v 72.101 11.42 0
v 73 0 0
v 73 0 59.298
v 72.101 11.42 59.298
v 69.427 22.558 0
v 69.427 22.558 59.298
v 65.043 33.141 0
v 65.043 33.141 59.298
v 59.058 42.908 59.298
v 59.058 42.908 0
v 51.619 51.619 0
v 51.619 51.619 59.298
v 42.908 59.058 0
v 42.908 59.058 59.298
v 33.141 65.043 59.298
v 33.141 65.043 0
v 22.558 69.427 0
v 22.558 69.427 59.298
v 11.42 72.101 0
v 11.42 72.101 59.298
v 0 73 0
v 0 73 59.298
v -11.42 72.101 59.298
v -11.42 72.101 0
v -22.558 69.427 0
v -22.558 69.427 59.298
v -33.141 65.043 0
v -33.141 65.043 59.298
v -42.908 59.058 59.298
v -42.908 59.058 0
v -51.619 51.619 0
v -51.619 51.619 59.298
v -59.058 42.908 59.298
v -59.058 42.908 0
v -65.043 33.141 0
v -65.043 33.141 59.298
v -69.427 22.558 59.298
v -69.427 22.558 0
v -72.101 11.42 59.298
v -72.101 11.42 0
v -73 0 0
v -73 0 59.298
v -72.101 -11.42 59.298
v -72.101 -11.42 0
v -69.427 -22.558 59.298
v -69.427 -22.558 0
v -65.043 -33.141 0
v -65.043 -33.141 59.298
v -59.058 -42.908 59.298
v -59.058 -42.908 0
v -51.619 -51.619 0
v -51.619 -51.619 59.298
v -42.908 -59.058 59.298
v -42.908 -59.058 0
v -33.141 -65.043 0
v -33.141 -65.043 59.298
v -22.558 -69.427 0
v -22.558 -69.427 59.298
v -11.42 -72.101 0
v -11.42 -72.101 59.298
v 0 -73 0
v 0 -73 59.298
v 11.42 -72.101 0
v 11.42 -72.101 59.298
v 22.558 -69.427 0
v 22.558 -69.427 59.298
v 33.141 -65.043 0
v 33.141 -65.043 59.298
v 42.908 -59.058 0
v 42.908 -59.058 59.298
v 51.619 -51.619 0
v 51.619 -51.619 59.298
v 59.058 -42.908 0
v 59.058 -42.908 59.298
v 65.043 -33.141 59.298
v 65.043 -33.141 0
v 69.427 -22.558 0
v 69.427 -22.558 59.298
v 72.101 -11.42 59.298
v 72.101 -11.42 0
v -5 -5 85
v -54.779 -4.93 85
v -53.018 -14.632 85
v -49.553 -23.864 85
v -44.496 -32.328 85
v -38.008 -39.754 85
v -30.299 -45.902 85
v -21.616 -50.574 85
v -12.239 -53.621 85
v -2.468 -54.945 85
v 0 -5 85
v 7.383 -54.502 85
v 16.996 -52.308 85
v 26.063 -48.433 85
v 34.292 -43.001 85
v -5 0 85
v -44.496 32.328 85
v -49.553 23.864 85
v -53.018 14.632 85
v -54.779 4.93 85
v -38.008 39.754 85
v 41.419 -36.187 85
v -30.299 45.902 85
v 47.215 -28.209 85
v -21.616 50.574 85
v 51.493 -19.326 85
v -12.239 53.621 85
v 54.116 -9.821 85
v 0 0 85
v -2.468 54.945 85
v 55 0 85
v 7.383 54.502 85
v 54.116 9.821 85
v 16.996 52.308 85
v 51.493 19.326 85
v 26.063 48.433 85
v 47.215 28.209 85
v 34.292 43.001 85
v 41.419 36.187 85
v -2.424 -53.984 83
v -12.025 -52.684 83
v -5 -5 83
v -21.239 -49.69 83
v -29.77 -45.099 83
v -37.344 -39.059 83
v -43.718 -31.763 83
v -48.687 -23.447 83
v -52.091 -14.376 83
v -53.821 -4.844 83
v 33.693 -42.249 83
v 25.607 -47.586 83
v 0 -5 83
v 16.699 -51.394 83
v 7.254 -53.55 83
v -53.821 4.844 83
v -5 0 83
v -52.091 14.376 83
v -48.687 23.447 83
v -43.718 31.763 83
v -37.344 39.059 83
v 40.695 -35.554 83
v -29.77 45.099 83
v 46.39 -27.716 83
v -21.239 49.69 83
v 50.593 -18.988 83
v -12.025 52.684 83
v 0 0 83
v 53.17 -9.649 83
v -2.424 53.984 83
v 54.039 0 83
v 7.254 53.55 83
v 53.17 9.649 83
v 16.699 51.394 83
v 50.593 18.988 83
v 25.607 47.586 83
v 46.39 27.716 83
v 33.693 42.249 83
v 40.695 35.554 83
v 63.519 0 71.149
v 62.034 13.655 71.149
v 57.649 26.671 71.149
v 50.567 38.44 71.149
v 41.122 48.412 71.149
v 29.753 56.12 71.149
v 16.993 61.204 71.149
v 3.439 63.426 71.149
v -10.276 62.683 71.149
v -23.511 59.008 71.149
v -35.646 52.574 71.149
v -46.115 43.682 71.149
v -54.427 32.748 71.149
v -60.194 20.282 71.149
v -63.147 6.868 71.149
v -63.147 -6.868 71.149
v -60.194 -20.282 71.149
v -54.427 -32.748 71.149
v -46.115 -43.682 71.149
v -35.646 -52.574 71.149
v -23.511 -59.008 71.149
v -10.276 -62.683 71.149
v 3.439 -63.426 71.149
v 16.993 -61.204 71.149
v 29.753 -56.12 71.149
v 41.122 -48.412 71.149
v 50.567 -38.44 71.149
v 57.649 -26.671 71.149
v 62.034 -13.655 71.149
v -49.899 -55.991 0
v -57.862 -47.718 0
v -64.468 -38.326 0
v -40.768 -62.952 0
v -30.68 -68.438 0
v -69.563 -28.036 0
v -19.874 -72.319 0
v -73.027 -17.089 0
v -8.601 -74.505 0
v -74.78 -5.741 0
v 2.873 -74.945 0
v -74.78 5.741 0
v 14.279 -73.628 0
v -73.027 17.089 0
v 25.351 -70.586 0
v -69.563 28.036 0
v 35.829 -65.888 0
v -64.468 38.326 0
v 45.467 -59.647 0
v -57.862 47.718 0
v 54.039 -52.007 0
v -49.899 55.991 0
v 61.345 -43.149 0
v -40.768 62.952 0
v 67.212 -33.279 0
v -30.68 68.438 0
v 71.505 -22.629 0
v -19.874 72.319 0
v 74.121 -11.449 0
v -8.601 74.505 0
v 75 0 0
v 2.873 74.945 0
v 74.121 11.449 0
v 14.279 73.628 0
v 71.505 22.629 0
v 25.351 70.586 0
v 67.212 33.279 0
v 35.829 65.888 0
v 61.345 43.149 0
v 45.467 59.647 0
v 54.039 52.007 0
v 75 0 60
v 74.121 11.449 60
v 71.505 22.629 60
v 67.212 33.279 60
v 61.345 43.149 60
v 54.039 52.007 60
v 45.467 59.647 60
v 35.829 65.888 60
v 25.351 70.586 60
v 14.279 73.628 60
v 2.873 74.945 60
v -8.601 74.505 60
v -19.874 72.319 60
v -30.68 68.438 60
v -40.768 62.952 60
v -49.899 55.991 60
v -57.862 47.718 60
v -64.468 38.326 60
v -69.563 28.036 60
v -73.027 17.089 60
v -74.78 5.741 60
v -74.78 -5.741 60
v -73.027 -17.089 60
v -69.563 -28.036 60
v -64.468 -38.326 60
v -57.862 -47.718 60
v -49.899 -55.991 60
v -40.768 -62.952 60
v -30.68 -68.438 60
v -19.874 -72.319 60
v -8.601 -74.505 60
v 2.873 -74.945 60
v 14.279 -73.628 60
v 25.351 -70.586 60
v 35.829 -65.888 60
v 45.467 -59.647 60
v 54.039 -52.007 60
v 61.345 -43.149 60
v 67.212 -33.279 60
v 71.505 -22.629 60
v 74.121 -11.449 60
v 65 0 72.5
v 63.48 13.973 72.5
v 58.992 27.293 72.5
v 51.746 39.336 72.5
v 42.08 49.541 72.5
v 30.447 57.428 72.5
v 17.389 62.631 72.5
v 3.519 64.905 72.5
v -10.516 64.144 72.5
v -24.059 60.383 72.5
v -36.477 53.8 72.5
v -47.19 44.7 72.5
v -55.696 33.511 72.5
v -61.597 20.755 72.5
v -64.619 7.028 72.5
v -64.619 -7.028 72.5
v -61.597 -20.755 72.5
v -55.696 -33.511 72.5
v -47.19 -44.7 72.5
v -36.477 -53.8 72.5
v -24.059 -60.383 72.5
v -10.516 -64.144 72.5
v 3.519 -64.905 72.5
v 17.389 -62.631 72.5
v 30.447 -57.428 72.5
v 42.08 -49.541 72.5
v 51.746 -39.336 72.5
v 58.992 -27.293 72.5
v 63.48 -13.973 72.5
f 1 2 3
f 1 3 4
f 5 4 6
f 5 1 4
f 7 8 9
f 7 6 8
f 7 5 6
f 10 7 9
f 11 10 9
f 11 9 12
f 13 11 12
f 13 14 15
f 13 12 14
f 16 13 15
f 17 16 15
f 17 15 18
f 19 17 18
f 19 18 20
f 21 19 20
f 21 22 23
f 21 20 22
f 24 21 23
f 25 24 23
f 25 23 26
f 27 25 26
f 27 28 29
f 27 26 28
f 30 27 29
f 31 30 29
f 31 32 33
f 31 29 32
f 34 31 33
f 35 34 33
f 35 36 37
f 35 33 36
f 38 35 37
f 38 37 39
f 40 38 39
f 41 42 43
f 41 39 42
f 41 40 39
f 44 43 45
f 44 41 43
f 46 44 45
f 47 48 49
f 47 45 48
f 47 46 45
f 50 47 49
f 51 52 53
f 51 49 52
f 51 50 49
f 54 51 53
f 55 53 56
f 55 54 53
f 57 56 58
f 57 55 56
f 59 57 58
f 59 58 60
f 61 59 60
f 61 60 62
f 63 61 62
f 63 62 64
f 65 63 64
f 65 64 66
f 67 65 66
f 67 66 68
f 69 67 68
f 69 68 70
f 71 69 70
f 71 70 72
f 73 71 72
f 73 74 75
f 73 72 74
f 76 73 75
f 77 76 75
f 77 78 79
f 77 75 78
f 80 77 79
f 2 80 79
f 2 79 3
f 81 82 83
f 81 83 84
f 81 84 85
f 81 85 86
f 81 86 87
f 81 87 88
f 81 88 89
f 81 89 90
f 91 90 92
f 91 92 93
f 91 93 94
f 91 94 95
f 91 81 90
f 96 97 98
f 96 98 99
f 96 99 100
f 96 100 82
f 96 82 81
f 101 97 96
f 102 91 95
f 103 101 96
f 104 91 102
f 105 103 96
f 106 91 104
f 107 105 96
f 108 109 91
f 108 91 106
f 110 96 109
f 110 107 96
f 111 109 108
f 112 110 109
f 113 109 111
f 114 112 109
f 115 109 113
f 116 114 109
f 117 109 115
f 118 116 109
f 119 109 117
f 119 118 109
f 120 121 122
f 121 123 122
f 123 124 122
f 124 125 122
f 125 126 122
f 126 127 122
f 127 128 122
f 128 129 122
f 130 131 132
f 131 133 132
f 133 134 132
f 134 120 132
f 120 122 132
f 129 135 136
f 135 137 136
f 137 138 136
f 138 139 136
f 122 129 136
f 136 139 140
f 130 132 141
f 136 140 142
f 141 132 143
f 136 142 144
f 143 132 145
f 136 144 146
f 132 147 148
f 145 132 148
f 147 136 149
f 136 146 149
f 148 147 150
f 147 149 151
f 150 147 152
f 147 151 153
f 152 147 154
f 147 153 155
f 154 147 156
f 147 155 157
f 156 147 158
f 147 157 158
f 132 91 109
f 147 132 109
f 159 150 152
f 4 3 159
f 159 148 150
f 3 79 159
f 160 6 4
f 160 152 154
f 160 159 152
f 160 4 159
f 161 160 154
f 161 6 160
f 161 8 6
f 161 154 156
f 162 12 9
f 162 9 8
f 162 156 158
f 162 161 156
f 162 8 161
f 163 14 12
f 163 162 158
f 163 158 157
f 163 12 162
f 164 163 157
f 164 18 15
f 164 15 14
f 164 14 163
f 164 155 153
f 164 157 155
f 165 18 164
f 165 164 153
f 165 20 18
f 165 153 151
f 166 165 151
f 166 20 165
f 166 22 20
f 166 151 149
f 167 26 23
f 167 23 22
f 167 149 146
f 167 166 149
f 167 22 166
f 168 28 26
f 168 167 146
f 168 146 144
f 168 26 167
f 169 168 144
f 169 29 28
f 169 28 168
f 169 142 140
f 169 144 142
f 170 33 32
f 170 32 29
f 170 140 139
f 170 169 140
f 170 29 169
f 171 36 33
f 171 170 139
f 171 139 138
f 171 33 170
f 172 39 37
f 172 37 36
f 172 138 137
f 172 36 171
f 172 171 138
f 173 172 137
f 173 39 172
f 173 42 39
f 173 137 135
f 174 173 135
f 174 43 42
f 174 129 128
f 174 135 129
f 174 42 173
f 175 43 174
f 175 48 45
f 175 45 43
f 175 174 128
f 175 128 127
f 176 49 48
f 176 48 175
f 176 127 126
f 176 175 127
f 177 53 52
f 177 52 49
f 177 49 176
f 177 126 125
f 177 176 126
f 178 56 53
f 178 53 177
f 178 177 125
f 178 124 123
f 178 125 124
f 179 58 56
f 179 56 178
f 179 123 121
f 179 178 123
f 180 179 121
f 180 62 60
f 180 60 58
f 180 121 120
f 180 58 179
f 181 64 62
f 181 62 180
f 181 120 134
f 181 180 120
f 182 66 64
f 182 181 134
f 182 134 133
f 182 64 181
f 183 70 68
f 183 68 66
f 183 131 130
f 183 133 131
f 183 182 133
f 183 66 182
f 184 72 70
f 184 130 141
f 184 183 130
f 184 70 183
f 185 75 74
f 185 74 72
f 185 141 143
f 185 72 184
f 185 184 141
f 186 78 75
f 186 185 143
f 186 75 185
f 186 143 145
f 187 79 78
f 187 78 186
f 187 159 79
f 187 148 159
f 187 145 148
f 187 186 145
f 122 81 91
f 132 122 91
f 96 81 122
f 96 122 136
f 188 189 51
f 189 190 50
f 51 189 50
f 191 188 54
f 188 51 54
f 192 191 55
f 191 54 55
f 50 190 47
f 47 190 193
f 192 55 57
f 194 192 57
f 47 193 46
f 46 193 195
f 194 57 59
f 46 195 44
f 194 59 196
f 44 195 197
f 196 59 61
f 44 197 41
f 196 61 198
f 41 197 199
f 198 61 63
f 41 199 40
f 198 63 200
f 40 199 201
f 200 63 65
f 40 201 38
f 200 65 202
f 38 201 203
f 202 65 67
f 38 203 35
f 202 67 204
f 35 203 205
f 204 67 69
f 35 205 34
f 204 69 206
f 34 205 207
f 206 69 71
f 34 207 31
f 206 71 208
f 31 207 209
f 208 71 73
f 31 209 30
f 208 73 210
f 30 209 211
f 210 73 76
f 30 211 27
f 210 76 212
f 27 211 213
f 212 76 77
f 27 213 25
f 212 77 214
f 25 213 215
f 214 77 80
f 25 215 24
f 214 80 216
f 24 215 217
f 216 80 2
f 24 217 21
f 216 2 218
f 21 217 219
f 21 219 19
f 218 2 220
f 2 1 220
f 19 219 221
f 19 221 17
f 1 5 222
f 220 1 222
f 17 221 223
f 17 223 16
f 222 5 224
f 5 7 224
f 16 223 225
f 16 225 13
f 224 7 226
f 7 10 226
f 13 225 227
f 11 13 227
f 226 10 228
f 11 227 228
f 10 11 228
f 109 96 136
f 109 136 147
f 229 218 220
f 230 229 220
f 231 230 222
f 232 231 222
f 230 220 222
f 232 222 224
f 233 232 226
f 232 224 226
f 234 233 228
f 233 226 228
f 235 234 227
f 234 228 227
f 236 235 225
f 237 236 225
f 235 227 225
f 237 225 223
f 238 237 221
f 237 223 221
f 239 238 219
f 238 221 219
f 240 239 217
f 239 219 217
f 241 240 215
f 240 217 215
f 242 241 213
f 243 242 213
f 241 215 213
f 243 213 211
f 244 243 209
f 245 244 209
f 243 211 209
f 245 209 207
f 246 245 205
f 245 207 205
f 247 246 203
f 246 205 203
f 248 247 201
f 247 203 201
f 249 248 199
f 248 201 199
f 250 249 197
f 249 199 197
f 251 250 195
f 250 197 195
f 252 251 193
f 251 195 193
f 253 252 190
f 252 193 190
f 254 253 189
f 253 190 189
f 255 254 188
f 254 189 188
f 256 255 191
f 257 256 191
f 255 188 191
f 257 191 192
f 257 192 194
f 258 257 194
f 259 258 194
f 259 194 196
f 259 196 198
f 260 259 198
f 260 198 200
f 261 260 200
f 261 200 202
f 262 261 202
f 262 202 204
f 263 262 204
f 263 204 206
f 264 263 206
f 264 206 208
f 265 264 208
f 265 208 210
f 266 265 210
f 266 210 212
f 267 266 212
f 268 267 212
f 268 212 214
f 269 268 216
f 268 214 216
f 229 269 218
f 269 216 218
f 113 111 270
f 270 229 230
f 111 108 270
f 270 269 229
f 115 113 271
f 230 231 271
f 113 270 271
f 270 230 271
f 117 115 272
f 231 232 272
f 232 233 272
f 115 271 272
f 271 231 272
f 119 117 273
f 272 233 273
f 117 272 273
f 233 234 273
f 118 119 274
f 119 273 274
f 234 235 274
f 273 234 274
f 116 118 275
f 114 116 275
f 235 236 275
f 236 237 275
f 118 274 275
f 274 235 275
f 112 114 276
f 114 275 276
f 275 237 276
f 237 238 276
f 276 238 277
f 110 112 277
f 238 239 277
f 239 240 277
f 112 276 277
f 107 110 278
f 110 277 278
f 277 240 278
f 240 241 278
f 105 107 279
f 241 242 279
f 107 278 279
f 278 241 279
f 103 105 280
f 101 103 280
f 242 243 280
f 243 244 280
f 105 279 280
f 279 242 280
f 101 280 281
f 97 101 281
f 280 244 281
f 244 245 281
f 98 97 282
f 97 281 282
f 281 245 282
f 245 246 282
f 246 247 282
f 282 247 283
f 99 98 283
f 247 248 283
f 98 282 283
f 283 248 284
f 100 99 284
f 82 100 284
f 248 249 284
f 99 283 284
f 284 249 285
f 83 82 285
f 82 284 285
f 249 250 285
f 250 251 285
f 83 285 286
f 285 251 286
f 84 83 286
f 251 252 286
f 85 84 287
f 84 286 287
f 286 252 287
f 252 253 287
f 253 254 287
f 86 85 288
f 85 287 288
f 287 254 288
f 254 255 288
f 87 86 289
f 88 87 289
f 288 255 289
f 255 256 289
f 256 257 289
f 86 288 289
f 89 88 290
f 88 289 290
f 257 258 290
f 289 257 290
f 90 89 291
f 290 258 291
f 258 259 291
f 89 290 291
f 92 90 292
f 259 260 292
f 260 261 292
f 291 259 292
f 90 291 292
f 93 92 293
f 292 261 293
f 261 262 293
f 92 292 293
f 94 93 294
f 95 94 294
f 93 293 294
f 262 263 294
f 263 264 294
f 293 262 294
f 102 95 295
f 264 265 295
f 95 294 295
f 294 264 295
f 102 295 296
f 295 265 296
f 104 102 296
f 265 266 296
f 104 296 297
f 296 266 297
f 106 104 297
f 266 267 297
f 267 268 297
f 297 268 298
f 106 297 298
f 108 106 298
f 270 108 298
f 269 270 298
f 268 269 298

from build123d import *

# Parameters (mm, degrees)
F0_R     = 75
F1_DEPTH = 85
F2_SIZE2 = 25
F2_SIZE  = 20
F3_T     = -2
F4_W     = 5
F4_H     = 5
F5_DEPTH = 85.001


# Not quite as in the source:
# - the program builds the solid bodies; features that only make, move or delete a surface that nothing else refers to are left out


with BuildPart() as f1:
    # F0 (on Top) → F1 (new body)
    with BuildSketch(Plane.XY):
        Circle(F0_R)
    extrude(amount=F1_DEPTH)

    # F2
    f2_edges = [f1.edges().sort_by_distance(p)[0] for p in [
        (-75, 0, 85),
    ]]
    f2_side = f1.faces().sort_by_distance((0, 0, 85))[0]
    chamfer(f2_edges, length=F2_SIZE, length2=F2_SIZE2, reference=f2_side)

    # F3
    f3_openings = [f1.faces().sort_by_distance(p)[0] for p in [
        (0, 0, 0),
    ]]
    offset(amount=F3_T, openings=f3_openings)

    # F4 (on face) → F5 (cut, through all)
    with BuildSketch(Plane.XY.offset(85)):
        with Locations((-2.5, -2.5)):
            Rectangle(F4_W, F4_H)
    extrude(amount=-F5_DEPTH, mode=Mode.SUBTRACT)


solid = f1.part
